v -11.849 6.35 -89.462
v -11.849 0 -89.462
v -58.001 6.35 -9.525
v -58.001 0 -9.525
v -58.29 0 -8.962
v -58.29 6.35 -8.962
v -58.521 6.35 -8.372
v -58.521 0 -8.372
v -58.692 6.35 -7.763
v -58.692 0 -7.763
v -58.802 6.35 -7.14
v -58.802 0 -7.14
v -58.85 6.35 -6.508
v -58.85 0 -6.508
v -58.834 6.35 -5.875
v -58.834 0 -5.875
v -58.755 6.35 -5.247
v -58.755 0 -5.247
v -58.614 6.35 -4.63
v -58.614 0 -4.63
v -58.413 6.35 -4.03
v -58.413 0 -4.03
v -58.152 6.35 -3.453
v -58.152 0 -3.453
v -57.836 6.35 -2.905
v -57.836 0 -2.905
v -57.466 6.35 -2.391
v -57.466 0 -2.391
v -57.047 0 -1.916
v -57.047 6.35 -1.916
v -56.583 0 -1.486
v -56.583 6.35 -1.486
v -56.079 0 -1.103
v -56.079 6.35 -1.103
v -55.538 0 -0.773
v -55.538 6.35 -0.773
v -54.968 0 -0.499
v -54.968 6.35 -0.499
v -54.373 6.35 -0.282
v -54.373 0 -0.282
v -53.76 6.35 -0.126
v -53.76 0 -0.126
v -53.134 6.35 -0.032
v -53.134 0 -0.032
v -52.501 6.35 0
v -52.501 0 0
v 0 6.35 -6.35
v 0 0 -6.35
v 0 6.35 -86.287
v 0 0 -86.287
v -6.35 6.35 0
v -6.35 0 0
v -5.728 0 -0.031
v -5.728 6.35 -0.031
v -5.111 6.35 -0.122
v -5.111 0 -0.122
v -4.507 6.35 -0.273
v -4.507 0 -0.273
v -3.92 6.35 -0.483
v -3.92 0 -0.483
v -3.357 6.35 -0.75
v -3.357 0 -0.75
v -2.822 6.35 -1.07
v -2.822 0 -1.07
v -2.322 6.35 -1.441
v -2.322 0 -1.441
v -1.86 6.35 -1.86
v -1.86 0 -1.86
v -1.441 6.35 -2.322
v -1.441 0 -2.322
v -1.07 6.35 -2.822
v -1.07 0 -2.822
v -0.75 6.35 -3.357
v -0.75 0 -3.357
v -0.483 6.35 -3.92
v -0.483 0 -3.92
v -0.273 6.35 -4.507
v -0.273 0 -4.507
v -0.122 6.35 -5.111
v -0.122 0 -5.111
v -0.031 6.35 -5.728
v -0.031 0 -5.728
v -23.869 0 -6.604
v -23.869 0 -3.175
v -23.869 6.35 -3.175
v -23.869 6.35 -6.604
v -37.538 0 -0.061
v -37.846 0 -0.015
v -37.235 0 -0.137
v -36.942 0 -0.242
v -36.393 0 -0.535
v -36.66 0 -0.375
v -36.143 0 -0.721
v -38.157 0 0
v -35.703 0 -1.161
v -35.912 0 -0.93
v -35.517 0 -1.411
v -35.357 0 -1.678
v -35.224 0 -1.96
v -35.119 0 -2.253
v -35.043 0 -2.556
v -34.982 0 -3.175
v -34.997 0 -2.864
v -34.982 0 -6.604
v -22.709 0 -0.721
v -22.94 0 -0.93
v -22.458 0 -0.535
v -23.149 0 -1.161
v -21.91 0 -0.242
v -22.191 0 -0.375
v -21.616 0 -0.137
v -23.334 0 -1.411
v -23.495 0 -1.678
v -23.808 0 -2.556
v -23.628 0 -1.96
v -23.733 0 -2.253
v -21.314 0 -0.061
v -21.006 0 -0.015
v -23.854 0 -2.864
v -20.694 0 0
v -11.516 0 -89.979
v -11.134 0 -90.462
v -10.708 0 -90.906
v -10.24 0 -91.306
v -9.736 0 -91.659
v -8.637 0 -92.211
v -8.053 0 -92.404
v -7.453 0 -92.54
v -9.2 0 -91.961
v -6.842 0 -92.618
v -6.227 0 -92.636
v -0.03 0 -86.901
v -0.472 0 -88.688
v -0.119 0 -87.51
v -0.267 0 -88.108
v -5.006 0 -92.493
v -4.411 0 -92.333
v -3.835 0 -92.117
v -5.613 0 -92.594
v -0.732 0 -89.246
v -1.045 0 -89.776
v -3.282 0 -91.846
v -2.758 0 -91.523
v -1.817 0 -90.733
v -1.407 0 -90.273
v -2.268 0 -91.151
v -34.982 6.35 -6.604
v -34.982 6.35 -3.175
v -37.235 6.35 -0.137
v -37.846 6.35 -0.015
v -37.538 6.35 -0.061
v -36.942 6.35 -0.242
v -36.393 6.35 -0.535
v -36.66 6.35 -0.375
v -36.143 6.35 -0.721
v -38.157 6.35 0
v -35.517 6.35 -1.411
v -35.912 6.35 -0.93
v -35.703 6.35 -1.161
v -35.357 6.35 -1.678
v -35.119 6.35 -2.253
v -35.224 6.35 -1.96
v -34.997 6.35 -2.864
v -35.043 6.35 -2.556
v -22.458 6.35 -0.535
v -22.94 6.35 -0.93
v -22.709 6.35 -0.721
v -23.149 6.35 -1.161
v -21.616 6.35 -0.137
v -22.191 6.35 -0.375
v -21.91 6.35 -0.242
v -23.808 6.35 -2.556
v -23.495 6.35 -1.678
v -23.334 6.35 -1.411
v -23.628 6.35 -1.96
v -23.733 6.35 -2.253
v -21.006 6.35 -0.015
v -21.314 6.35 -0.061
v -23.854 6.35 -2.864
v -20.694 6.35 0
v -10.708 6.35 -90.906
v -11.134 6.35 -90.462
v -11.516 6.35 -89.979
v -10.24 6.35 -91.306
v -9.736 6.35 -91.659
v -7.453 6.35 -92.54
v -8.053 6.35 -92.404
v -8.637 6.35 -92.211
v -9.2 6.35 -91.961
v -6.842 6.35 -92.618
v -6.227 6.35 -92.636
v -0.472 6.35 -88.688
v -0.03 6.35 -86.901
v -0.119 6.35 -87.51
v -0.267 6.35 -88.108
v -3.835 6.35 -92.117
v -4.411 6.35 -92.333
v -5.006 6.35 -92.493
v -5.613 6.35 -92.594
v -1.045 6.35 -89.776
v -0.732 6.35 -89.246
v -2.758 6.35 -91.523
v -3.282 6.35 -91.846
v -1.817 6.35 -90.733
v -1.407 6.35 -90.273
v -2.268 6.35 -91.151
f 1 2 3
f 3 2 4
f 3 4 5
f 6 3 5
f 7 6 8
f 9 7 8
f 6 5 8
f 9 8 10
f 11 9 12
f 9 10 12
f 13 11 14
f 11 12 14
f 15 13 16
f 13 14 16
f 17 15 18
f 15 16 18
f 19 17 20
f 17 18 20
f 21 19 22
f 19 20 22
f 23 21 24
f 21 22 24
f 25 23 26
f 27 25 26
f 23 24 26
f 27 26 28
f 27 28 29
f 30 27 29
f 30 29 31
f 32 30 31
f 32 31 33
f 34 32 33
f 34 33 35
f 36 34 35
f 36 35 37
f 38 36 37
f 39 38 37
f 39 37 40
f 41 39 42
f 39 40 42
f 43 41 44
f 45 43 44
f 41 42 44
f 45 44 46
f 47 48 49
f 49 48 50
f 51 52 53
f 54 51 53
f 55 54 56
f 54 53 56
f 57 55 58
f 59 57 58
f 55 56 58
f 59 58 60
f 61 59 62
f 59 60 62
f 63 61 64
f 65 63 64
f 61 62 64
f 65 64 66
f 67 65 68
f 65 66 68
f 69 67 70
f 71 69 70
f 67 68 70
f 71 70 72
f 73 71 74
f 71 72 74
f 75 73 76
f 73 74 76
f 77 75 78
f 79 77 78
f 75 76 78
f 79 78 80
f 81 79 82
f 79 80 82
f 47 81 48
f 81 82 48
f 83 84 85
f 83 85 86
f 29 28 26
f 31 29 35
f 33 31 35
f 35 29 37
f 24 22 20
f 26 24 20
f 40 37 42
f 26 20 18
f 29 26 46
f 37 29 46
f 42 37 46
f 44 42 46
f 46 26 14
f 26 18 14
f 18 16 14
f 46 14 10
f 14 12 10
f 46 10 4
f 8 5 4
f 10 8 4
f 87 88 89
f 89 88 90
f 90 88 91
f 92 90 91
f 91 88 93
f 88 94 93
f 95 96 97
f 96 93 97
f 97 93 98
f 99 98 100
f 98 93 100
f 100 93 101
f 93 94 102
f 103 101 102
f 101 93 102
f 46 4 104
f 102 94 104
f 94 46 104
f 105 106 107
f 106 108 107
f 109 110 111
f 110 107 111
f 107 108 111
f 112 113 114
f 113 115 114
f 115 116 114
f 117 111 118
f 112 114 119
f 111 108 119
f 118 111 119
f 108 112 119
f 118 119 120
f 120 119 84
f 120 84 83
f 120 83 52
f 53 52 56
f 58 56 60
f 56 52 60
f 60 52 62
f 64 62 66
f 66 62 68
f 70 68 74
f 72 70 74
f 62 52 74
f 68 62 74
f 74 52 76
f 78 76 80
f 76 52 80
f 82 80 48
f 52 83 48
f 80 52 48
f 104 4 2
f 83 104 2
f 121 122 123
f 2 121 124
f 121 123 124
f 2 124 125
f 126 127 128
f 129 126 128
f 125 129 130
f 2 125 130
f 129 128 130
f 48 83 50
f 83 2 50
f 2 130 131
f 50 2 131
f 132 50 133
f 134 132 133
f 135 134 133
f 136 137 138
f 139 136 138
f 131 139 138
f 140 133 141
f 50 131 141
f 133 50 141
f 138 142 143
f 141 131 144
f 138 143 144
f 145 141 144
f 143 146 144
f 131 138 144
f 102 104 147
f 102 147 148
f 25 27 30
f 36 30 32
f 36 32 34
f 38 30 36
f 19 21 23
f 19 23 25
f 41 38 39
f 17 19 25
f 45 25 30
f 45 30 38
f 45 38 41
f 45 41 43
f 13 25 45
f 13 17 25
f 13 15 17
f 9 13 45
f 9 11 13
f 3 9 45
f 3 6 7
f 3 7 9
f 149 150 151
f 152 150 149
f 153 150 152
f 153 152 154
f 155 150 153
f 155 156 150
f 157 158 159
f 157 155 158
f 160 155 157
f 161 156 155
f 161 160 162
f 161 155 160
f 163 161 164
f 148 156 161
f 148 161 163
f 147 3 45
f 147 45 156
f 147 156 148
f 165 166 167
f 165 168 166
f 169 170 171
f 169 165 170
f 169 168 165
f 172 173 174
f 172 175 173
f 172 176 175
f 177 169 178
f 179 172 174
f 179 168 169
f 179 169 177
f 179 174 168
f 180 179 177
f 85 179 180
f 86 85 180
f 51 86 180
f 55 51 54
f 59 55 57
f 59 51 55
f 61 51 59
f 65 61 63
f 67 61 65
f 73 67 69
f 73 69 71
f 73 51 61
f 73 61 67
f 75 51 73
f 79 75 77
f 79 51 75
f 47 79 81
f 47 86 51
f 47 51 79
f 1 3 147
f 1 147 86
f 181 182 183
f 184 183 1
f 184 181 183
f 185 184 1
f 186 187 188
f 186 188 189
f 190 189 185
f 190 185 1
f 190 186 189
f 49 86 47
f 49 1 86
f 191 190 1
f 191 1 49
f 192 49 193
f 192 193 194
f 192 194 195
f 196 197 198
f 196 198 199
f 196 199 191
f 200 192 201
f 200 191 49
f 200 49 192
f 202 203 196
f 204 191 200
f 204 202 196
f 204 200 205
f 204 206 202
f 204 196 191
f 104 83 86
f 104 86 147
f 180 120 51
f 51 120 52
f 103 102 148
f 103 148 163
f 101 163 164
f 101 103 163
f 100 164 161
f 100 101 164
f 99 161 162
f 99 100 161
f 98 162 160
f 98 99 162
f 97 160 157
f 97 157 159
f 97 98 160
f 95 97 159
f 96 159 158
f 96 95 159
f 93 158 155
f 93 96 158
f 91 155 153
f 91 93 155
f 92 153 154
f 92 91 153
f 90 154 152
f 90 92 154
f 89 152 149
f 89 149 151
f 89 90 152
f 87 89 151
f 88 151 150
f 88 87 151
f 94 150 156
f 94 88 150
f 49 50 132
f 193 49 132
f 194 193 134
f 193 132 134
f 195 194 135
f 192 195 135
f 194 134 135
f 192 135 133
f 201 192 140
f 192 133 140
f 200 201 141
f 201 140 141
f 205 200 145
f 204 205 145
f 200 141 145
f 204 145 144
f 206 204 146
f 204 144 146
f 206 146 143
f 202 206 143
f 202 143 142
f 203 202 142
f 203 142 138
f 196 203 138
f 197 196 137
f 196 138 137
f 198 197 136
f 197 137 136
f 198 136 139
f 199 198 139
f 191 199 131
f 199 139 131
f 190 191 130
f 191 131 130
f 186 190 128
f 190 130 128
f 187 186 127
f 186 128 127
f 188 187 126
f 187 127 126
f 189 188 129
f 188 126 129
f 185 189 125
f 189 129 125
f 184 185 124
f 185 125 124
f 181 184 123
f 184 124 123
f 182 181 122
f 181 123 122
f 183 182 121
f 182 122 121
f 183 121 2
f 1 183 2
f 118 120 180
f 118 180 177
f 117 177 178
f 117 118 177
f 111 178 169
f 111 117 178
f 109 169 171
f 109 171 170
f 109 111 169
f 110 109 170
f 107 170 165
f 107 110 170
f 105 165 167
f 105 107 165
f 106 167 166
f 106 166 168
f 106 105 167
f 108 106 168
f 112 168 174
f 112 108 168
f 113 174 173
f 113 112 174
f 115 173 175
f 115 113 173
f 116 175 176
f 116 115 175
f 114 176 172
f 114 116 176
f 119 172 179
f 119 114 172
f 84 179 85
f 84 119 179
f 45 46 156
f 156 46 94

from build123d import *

# Parameters (mm, degrees)
BOSS_EXTRUDE1_DEPTH = 6.35
CUT_EXTRUDE1_DEPTH  = 110.933515147


with BuildPart() as part:
    # Sketch1 → Boss-Extrude1 (new body)
    with BuildSketch(Plane(origin=(0, 0, 0), x_dir=(1, 0, 0), z_dir=(0, 1, 0))):
        with BuildLine():
            Line((0, 6.35), (0, 86.286703653))
            ThreePointArc((0, 86.286703653), (-4.706499064, 92.420332649), (-11.849261314, 89.461703653))
            Line((-11.849261314, 89.461703653), (-58.000738686, 9.525))
            ThreePointArc((-58.000738686, 9.525), (-58.000738686, 3.175), (-52.501477372, 0))
            Line((-52.501477372, 0), (-6.35, 0))
            ThreePointArc((-6.35, 0), (-1.859871939, 1.859871939), (0, 6.35))
        make_face()
    extrude(amount=BOSS_EXTRUDE1_DEPTH)

    # Sketch3 → Cut-Extrude1 (cut, through all)
    with BuildSketch(Plane.XZ):
        with BuildLine():
            Line((-23.869488686, -6.604), (-34.981988686, -6.604))
            Line((-34.981988686, -6.604), (-34.981988686, -3.175))
            ThreePointArc((-34.981988686, -3.175), (-35.911924656, -0.92993597), (-38.156988686, 0))
            Line((-38.156988686, 0), (-20.694488686, 0))
            ThreePointArc((-20.694488686, 0), (-22.939552716, -0.92993597), (-23.869488686, -3.175))
            Line((-23.869488686, -3.175), (-23.869488686, -6.604))
        make_face()
    extrude(amount=-CUT_EXTRUDE1_DEPTH, mode=Mode.SUBTRACT)


solid = part.part
